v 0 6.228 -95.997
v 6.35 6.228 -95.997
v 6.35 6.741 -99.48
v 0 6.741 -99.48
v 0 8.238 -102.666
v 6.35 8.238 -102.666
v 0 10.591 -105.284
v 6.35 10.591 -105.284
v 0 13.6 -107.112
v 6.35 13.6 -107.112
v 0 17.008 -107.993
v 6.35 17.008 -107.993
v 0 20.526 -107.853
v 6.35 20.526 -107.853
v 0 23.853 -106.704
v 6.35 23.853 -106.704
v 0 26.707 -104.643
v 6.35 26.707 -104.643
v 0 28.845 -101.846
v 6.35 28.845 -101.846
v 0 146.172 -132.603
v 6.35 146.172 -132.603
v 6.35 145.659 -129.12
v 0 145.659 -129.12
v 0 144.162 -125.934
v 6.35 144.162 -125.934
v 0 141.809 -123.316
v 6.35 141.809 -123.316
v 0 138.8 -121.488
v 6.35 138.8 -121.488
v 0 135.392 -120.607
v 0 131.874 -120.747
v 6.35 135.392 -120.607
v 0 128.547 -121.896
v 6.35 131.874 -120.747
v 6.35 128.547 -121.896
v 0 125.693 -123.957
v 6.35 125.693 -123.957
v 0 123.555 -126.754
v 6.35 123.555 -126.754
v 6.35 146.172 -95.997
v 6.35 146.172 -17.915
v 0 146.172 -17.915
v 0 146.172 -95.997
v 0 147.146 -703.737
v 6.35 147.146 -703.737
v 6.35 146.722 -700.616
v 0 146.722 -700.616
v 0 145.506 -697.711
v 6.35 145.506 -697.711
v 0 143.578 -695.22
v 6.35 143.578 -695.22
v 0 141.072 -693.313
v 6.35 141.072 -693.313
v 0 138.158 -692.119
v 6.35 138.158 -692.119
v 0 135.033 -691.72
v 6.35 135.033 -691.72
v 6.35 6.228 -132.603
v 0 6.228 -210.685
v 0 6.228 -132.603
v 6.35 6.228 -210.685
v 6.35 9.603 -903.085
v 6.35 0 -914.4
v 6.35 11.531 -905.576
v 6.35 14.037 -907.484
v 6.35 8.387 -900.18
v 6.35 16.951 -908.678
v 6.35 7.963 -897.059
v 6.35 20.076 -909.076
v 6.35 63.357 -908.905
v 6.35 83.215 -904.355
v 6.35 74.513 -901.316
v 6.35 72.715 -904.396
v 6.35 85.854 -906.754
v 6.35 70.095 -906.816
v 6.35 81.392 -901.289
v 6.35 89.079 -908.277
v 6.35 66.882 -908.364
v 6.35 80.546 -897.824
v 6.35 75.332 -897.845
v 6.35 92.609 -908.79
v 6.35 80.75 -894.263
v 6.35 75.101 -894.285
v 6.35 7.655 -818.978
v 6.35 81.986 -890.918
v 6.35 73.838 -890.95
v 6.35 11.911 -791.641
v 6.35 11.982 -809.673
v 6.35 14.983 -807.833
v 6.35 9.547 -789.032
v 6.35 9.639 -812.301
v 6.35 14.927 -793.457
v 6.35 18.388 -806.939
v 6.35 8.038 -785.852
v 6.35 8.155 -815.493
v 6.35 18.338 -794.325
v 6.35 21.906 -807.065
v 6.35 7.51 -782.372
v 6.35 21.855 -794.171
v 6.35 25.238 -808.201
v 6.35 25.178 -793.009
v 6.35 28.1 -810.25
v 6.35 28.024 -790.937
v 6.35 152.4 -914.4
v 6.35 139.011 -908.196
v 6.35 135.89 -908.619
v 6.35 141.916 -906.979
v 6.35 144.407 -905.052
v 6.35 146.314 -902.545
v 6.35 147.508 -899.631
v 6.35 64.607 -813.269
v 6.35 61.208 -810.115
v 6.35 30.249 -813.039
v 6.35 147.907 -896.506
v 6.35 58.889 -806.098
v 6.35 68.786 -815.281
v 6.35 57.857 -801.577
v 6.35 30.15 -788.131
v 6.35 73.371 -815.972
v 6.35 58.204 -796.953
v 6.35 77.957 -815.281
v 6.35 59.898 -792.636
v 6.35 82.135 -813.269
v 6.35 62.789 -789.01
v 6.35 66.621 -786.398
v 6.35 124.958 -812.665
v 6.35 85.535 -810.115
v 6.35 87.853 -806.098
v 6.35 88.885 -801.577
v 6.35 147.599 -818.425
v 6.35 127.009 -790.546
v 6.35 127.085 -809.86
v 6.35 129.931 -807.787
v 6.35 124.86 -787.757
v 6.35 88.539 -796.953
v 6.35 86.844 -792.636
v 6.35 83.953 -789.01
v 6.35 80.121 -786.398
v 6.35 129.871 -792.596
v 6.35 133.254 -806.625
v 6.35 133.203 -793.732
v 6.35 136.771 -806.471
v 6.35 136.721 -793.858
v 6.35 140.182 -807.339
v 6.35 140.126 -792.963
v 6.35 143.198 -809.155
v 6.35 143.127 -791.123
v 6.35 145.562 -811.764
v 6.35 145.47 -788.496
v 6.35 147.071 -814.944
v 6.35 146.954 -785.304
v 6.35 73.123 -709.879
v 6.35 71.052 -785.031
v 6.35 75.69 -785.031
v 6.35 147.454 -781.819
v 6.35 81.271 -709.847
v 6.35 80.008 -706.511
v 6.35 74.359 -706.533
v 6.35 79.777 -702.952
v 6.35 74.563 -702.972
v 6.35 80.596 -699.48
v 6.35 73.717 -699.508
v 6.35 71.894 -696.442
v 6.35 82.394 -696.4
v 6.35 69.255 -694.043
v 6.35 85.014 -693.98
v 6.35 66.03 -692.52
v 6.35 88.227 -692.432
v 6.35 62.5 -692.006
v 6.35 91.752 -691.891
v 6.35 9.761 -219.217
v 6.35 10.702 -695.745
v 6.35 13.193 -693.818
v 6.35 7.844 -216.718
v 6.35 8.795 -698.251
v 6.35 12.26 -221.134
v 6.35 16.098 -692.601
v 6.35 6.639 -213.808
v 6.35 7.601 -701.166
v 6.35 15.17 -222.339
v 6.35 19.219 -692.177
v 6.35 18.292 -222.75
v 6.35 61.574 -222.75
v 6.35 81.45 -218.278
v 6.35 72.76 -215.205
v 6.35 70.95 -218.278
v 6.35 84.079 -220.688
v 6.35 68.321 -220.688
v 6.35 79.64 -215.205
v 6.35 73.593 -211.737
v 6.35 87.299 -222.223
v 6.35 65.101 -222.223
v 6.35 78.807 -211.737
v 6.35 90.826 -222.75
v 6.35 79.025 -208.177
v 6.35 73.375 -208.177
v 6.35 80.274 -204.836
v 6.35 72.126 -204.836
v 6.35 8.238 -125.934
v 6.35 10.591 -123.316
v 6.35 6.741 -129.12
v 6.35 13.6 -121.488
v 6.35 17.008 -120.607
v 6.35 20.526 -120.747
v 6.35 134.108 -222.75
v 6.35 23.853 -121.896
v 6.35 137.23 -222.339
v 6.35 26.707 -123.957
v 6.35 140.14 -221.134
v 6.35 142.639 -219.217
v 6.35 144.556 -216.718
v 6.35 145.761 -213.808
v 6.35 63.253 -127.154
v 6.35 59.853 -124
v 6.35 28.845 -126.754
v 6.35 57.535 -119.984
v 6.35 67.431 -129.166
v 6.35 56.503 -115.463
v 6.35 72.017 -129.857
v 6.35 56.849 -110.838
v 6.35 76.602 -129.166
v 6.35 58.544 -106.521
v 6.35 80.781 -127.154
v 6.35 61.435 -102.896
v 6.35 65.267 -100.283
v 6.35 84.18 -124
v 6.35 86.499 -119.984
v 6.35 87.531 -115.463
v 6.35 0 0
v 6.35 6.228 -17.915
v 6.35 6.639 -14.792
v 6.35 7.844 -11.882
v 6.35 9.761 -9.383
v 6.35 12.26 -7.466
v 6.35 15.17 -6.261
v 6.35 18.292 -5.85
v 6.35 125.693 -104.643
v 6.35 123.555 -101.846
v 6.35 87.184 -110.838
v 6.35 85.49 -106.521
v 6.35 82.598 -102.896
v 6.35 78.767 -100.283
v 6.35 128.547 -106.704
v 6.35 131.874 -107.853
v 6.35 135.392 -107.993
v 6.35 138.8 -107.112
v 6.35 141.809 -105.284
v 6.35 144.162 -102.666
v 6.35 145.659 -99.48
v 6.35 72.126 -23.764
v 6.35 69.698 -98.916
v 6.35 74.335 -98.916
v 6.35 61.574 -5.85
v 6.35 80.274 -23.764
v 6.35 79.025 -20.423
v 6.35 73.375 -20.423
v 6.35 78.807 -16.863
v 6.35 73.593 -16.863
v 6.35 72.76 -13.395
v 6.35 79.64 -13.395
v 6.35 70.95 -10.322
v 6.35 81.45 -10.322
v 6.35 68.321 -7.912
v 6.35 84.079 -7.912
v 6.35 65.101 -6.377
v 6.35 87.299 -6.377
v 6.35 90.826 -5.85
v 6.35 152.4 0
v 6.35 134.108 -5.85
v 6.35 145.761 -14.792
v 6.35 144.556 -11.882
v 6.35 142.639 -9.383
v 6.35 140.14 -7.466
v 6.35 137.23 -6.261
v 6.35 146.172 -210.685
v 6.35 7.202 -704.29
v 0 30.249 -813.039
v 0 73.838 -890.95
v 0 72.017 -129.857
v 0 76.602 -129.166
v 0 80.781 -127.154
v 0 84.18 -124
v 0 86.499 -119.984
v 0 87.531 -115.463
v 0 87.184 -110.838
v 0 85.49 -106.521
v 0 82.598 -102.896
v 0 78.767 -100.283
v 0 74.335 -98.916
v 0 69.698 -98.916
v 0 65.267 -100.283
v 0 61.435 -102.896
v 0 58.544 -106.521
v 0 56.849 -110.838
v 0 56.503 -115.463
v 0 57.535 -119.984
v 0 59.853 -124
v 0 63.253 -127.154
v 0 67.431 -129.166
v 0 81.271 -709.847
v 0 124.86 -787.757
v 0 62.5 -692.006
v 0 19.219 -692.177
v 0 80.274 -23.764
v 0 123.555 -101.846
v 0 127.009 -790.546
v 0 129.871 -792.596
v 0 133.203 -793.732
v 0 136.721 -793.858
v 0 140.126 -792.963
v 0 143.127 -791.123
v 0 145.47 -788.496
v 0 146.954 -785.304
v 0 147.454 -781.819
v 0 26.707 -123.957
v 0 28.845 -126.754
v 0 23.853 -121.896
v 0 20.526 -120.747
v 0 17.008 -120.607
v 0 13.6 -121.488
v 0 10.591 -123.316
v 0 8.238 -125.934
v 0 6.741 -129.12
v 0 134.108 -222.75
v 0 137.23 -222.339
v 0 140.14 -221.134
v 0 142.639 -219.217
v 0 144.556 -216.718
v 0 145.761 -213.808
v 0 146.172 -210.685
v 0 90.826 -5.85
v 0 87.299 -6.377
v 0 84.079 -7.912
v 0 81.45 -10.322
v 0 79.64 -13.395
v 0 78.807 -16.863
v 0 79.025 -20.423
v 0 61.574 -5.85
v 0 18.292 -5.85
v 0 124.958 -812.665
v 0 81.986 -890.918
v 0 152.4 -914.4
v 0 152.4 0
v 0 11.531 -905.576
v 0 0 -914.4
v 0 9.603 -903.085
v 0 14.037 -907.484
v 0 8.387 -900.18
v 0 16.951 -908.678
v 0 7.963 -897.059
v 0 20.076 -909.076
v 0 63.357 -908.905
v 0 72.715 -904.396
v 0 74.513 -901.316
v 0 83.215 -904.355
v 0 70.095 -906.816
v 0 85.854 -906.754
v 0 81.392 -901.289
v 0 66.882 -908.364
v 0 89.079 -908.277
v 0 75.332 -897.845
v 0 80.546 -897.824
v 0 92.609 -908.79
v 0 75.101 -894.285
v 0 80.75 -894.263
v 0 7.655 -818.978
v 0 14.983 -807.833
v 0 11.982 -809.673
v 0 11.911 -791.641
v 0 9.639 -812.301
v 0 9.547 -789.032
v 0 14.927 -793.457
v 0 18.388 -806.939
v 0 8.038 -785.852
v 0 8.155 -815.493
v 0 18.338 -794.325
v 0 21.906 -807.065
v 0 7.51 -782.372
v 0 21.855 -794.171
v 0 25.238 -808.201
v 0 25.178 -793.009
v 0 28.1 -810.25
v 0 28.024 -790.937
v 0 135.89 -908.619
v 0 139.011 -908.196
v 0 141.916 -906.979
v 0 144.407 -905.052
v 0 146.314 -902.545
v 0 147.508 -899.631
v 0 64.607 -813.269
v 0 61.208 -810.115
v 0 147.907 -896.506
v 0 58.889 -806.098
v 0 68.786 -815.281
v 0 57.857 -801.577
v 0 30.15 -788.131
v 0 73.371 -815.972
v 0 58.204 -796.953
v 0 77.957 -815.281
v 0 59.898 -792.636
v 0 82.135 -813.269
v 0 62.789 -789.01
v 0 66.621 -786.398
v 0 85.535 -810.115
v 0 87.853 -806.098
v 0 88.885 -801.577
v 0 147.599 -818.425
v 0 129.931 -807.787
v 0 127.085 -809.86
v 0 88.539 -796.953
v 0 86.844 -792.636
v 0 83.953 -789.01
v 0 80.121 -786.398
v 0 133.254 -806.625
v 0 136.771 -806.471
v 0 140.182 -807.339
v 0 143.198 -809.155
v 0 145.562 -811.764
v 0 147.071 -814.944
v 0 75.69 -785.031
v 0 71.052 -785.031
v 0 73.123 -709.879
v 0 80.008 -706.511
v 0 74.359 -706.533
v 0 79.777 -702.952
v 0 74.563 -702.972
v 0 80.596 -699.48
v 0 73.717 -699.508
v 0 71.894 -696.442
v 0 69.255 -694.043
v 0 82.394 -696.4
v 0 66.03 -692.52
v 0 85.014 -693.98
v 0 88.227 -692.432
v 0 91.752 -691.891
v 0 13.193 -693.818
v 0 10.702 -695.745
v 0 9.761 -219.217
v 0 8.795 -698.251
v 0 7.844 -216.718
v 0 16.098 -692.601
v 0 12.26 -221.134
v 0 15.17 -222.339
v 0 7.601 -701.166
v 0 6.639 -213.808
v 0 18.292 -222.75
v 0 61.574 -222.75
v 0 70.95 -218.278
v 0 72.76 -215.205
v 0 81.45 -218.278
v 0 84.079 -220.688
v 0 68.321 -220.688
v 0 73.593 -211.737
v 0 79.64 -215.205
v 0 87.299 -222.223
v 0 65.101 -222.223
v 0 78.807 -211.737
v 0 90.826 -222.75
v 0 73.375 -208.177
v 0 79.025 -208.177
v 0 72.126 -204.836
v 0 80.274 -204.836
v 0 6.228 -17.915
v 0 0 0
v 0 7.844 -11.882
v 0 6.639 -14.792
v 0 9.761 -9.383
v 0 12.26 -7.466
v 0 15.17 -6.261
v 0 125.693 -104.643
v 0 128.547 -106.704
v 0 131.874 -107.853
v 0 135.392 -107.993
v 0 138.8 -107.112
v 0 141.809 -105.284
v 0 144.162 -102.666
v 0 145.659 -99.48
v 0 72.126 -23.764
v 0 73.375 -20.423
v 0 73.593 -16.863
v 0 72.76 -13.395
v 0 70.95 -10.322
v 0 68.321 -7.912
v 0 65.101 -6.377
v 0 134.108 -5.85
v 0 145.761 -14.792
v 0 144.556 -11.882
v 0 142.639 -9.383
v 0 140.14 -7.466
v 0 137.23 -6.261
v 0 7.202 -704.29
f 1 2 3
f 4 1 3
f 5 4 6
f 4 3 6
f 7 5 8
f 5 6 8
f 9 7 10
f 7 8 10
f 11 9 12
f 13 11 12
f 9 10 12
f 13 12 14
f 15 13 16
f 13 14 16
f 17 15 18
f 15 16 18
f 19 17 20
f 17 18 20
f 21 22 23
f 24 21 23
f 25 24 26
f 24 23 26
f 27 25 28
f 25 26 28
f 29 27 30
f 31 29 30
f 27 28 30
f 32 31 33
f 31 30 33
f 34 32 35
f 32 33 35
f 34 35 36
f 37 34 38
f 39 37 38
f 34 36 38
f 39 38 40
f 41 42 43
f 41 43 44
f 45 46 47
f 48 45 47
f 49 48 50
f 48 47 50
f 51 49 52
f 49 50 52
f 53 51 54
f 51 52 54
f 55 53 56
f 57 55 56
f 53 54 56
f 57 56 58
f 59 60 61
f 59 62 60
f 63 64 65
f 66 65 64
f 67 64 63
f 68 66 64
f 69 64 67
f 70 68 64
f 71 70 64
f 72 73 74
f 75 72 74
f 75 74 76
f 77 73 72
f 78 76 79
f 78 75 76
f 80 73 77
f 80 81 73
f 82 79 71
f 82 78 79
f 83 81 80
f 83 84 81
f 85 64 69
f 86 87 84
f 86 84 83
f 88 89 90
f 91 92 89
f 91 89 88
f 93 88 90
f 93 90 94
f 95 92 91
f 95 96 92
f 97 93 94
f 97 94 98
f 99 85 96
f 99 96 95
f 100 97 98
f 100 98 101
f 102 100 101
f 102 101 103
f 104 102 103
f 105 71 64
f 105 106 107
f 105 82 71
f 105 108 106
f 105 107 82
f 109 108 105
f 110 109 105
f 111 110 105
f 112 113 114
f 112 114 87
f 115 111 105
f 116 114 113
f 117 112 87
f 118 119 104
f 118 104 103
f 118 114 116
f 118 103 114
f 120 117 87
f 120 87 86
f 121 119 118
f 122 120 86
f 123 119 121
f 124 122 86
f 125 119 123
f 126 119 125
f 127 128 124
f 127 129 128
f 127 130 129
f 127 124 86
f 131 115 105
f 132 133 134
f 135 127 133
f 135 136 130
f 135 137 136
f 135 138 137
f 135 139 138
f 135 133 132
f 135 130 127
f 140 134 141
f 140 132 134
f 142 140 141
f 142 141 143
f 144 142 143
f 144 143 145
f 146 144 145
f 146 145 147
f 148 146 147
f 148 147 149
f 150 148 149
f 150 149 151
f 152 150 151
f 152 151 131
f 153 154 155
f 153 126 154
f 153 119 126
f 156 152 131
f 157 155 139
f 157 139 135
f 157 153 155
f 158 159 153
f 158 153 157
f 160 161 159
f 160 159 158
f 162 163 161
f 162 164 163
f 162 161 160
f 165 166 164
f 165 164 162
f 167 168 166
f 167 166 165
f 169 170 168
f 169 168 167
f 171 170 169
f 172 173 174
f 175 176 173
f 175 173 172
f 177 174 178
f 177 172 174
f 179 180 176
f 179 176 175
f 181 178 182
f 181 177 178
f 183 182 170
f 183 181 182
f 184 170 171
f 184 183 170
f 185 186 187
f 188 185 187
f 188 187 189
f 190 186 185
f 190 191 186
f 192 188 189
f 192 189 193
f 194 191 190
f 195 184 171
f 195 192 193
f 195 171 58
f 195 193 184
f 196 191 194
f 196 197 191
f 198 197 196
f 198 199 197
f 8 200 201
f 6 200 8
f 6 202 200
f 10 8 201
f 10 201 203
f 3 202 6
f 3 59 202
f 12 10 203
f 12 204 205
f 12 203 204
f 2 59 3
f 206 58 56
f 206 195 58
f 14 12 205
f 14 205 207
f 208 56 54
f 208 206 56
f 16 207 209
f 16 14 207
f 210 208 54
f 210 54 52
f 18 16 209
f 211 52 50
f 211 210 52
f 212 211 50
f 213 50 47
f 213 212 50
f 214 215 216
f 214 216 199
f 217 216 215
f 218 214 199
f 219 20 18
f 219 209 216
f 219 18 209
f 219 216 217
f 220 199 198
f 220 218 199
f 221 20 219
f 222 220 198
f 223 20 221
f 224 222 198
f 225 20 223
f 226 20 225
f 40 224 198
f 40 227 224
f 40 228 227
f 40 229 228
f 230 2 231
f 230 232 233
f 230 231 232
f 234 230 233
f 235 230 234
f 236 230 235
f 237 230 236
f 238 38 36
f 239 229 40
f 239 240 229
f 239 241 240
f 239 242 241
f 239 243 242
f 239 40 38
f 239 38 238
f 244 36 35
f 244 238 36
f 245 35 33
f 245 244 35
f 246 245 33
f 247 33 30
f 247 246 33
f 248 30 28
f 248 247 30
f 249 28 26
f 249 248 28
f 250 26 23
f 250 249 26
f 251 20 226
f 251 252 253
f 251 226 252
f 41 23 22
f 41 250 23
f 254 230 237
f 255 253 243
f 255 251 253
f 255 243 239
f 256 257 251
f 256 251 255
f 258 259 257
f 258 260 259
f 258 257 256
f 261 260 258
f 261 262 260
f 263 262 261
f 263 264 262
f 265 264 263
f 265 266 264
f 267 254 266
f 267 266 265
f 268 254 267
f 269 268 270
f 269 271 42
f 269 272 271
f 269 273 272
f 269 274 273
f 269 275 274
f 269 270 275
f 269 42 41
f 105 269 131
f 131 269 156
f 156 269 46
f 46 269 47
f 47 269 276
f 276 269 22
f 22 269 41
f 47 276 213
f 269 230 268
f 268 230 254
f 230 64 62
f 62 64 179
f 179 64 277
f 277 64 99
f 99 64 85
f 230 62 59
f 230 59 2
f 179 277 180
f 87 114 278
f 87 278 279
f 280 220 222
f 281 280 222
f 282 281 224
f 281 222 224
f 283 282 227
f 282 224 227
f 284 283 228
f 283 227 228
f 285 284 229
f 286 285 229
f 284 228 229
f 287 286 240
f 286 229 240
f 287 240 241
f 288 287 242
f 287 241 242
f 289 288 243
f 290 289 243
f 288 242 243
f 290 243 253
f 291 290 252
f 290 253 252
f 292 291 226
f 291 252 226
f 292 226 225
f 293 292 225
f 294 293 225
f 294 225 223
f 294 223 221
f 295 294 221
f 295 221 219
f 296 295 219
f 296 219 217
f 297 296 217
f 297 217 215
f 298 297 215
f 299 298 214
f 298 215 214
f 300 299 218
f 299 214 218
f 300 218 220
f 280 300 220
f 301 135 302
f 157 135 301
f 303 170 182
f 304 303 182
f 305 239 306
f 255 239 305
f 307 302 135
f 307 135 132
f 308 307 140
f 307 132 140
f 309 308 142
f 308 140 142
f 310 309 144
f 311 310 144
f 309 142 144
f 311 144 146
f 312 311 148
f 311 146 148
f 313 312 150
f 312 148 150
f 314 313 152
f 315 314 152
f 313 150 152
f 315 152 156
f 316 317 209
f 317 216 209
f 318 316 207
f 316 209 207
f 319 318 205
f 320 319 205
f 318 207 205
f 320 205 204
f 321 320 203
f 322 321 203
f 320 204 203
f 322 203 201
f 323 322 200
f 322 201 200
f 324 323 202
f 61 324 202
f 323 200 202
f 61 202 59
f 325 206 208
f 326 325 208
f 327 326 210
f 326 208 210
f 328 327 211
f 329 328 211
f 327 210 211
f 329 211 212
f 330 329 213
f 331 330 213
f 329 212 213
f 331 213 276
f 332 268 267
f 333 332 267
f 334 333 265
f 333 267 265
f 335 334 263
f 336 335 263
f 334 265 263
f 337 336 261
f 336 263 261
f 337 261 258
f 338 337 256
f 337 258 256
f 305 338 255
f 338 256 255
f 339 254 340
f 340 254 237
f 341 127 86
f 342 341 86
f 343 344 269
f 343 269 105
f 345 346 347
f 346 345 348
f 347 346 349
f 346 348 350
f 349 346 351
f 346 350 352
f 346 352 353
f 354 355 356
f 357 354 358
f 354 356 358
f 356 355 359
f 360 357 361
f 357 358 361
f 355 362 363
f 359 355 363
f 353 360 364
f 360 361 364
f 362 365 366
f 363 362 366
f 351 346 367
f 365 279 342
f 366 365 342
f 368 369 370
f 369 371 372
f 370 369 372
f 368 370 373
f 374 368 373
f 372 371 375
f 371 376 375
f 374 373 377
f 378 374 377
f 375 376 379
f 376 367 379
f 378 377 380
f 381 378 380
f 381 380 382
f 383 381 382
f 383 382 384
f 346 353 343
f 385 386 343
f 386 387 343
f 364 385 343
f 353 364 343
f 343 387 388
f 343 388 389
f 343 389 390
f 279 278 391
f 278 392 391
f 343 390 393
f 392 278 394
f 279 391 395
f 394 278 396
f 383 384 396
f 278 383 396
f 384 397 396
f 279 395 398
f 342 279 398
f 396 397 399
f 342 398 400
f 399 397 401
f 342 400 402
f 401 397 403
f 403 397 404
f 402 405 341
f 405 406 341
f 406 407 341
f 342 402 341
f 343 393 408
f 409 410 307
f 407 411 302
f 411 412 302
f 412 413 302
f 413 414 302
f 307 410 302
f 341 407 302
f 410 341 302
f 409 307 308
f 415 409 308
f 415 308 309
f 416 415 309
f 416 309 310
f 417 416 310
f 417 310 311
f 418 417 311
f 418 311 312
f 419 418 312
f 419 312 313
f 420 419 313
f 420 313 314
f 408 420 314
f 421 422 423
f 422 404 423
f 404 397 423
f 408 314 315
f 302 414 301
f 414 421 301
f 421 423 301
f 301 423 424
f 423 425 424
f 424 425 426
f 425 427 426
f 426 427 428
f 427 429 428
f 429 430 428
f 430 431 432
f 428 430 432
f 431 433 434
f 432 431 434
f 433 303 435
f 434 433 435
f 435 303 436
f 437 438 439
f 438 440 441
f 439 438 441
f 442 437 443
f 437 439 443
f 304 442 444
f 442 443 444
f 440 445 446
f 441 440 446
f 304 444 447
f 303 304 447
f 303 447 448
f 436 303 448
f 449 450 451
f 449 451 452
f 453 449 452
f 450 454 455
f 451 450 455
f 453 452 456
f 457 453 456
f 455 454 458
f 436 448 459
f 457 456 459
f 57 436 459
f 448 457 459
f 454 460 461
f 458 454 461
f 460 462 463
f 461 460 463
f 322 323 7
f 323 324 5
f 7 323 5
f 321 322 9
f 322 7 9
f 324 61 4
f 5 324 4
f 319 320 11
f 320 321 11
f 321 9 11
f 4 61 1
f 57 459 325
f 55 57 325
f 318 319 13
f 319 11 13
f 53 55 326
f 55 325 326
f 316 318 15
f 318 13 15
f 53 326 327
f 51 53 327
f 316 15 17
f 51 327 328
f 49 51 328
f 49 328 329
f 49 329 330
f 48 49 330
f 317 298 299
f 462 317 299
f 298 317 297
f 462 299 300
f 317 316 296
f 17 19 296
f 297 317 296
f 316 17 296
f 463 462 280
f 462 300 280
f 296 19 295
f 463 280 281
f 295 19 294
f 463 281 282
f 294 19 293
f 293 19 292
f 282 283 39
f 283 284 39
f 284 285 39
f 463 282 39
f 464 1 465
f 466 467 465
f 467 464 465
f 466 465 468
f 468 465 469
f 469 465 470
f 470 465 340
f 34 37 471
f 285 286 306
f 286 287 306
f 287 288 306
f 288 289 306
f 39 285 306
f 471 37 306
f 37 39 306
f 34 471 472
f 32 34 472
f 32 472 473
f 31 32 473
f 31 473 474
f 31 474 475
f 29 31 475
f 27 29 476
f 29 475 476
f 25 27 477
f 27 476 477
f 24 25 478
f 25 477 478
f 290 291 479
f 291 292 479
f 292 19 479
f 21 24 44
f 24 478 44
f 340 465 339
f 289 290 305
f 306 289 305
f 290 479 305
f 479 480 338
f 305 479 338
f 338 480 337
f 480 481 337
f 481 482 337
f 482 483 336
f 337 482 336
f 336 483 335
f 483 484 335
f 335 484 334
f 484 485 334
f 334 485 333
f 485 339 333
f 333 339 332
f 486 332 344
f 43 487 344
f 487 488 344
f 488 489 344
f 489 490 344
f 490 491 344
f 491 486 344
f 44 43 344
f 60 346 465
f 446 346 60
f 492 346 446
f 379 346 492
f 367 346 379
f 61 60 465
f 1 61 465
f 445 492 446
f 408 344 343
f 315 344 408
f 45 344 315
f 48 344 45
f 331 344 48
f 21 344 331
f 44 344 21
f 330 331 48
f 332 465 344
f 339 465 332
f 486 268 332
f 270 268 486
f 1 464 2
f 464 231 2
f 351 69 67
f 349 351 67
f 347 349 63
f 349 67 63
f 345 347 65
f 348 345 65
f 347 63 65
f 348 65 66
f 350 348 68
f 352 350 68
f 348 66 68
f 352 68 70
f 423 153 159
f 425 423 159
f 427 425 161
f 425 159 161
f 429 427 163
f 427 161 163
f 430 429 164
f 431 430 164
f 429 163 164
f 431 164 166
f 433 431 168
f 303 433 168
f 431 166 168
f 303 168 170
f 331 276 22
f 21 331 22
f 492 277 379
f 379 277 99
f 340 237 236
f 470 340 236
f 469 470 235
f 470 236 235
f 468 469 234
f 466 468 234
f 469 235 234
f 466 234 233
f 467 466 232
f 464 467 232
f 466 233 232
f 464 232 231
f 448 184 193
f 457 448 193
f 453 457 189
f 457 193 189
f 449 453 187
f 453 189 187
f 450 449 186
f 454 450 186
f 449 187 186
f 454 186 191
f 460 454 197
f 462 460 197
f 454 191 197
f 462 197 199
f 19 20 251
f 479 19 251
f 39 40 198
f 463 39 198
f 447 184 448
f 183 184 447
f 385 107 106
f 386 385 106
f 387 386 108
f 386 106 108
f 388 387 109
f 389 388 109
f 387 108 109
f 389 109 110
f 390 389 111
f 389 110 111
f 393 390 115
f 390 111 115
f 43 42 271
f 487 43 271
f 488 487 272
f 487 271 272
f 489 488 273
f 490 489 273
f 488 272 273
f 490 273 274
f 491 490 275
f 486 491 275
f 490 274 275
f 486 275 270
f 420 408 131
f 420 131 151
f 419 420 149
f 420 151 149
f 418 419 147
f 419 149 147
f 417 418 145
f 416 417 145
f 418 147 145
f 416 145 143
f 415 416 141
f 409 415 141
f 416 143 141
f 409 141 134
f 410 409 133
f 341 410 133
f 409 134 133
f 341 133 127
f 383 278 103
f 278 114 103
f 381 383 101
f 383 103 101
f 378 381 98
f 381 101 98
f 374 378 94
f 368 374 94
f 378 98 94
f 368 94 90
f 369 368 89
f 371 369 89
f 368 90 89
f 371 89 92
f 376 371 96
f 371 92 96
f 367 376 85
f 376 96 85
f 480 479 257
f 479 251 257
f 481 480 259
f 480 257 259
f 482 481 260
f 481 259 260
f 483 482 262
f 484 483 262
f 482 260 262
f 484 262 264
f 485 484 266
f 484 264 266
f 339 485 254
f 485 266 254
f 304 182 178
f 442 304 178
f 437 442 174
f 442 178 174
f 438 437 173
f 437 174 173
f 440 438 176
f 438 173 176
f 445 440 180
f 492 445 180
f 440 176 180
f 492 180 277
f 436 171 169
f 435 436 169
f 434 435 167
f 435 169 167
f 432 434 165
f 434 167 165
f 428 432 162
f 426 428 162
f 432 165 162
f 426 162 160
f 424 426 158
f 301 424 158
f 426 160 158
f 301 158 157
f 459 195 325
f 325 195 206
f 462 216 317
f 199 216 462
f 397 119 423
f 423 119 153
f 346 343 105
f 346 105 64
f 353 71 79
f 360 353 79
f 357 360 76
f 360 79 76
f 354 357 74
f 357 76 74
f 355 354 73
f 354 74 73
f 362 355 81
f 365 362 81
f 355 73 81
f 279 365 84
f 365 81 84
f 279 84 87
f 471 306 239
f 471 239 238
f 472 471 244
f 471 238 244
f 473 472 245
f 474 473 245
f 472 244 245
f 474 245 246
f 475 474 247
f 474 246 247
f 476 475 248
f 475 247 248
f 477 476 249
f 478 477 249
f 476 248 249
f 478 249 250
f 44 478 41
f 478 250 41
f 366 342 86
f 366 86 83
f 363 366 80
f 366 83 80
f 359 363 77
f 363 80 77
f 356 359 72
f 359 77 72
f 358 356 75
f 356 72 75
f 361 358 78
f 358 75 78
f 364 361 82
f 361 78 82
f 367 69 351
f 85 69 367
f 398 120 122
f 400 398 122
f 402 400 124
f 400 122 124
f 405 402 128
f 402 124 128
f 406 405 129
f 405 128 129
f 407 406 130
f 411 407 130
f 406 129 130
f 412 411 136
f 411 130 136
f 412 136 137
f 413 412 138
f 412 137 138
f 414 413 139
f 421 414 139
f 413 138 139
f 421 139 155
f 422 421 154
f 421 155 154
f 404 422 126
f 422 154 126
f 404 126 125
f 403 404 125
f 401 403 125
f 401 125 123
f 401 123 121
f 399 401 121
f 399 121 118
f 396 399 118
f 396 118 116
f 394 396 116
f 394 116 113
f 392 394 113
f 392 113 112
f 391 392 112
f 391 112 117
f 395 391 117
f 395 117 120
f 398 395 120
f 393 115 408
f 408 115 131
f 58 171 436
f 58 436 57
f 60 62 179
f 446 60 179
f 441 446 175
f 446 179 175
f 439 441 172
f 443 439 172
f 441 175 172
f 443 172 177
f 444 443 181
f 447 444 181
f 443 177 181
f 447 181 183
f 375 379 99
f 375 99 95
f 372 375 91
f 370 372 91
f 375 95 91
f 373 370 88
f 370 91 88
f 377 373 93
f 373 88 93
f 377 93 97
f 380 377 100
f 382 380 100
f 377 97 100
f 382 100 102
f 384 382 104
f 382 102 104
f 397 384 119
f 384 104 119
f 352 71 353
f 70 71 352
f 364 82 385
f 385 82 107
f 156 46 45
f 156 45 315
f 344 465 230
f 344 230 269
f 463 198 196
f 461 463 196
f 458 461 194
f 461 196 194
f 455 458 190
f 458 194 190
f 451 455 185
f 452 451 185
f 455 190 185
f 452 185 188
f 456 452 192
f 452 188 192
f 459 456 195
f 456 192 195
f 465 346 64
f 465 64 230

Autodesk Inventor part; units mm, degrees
ref_plane "YZ Plane" through (0, 0, 0) normal (1, 0, 0) x (0, 1, 0)
ref_plane "XZ Plane" through (0, 0, 0) normal (0, 1, 0) x (-1, 0, 0)
ref_plane "XY Plane" through (0, 0, 0) normal (0, 0, 1) x (1, 0, 0)
sketch "Sketch1" plane through (0, 0, 0) normal (1, 0, 0) x (0, 1, 0)
  line L0 (0, 0) -> (152.4, 0)
  line L1 (152.4, 0) -> (152.4, -914.4)
  line L2 (152.4, -914.4) -> (0, -914.4)
  line L3 (0, -914.4) -> (0, 0)
  dimension "d0" = 152.4
  dimension "d1" = 914.4
extrude "Extrusion1" add sketch "Sketch1" along normal blind 6.35
sketch "Sketch2" plane through (6.35, 0, 0) normal (1, 0, 0) x (0, 0, -1)
  line L0 (0, 152.4) -> (0, 0) construction
  line L1 (914.4, 152.4) -> (0, 152.4) construction
  line L2 (0, 152.4) -> (457.2, 152.4) construction
  line L3 (228.6, 152.4) -> (0, 152.4) construction
  line L4 (17.9147, 146.1725) -> (95.9969, 146.1725)
  arc A0 (101.8461, 123.5552) -> (95.9969, 146.1725) centre (95.9969, 134.1075) ccw
  line L5 (101.8461, 123.5552) -> (23.7639, 80.2737)
  arc A1 (5.8497, 90.826) -> (23.7639, 80.2737) centre (17.9147, 90.826) ccw
  line L6 (5.8497, 90.826) -> (5.8497, 134.1075)
  arc A2 (17.9147, 146.1725) -> (5.8497, 134.1075) centre (17.9147, 134.1075) ccw
  line L7 (210.6853, 146.1725) -> (132.6031, 146.1725)
  arc A3 (132.6031, 146.1725) -> (126.7539, 123.5552) centre (132.6031, 134.1075) ccw
  line L8 (126.7539, 123.5552) -> (204.8361, 80.2737)
  arc A4 (204.8361, 80.2737) -> (222.7503, 90.826) centre (210.6853, 90.826) ccw
  line L9 (222.7503, 90.826) -> (222.7503, 134.1075)
  arc A5 (222.7503, 134.1075) -> (210.6853, 146.1725) centre (210.6853, 134.1075) ccw
  line L10 (17.9147, 6.2275) -> (95.9969, 6.2275)
  arc A6 (95.9969, 6.2275) -> (101.8461, 28.8448) centre (95.9969, 18.2925) ccw
  line L11 (101.8461, 28.8448) -> (23.7639, 72.1263)
  arc A7 (23.7639, 72.1263) -> (5.8497, 61.574) centre (17.9147, 61.574) ccw
  line L12 (5.8497, 61.574) -> (5.8497, 18.2925)
  arc A8 (5.8497, 18.2925) -> (17.9147, 6.2275) centre (17.9147, 18.2925) ccw
  line L13 (126.7539, 28.8448) -> (204.8361, 72.1263)
  line L14 (210.6853, 6.2275) -> (132.6031, 6.2275)
  line L15 (222.7503, 61.574) -> (222.7503, 18.2925)
  arc A9 (222.7503, 61.574) -> (204.8361, 72.1263) centre (210.6853, 61.574) ccw
  arc A10 (210.6853, 6.2275) -> (222.7503, 18.2925) centre (210.6853, 18.2925) ccw
  arc A11 (126.7539, 28.8448) -> (132.6031, 6.2275) centre (132.6031, 18.2925) ccw
  line L16 (896.5064, 147.907) -> (818.4249, 147.5987)
  arc A12 (818.4249, 147.5987) -> (812.6651, 124.9585) centre (818.4726, 135.5338) ccw
  line L17 (812.6651, 124.9585) -> (890.9175, 81.9857)
  arc A13 (890.9175, 81.9857) -> (908.7899, 92.6086) centre (896.725, 92.561) ccw
  line L18 (908.7899, 92.6086) -> (908.619, 135.8897)
  arc A14 (908.619, 135.8897) -> (896.5064, 147.907) centre (896.5541, 135.8421) ccw
  line L19 (787.7574, 124.8602) -> (709.8468, 81.2707)
  line L20 (703.7374, 147.1459) -> (781.8189, 147.4542)
  line L21 (691.891, 91.7522) -> (691.7201, 135.0333)
  arc A15 (691.891, 91.7522) -> (709.8468, 81.2707) centre (703.9559, 91.7998) ccw
  arc A16 (703.7374, 147.1459) -> (691.7201, 135.0333) centre (703.785, 135.081) ccw
  arc A17 (787.7574, 124.8602) -> (781.8189, 147.4542) centre (781.8665, 135.3893) ccw
  arc A18 (897.059, 7.9631) -> (909.0763, 20.0757) centre (897.0113, 20.028) ccw
  line L22 (897.059, 7.9631) -> (818.9775, 7.6548)
  line L23 (813.039, 30.2488) -> (890.9496, 73.8383)
  arc A19 (813.039, 30.2488) -> (818.9775, 7.6548) centre (818.9298, 19.7197) ccw
  line L24 (908.9054, 63.3568) -> (909.0763, 20.0757)
  arc A20 (908.9054, 63.3568) -> (890.9496, 73.8383) centre (896.8405, 63.3092) ccw
  arc A21 (782.3715, 7.5103) -> (788.1313, 30.1505) centre (782.3238, 19.5752) ccw
  line L25 (704.29, 7.202) -> (782.3715, 7.5103)
  arc A22 (709.8789, 73.1233) -> (692.0065, 62.5004) centre (704.0714, 62.548) ccw
  line L26 (692.0065, 62.5004) -> (692.1774, 19.2192)
  arc A23 (692.1774, 19.2192) -> (704.29, 7.202) centre (704.2423, 19.2669) ccw
  line L27 (788.1313, 30.1505) -> (709.8789, 73.1233)
  circle A24 centre (114.3, 72.0167) radius 15.5575
  circle A25 centre (800.4147, 73.3712) radius 15.5575
extrude "Extrusion3" cut sketch "Sketch2" against normal blind 25.4
properties part number "R-SideV1"
